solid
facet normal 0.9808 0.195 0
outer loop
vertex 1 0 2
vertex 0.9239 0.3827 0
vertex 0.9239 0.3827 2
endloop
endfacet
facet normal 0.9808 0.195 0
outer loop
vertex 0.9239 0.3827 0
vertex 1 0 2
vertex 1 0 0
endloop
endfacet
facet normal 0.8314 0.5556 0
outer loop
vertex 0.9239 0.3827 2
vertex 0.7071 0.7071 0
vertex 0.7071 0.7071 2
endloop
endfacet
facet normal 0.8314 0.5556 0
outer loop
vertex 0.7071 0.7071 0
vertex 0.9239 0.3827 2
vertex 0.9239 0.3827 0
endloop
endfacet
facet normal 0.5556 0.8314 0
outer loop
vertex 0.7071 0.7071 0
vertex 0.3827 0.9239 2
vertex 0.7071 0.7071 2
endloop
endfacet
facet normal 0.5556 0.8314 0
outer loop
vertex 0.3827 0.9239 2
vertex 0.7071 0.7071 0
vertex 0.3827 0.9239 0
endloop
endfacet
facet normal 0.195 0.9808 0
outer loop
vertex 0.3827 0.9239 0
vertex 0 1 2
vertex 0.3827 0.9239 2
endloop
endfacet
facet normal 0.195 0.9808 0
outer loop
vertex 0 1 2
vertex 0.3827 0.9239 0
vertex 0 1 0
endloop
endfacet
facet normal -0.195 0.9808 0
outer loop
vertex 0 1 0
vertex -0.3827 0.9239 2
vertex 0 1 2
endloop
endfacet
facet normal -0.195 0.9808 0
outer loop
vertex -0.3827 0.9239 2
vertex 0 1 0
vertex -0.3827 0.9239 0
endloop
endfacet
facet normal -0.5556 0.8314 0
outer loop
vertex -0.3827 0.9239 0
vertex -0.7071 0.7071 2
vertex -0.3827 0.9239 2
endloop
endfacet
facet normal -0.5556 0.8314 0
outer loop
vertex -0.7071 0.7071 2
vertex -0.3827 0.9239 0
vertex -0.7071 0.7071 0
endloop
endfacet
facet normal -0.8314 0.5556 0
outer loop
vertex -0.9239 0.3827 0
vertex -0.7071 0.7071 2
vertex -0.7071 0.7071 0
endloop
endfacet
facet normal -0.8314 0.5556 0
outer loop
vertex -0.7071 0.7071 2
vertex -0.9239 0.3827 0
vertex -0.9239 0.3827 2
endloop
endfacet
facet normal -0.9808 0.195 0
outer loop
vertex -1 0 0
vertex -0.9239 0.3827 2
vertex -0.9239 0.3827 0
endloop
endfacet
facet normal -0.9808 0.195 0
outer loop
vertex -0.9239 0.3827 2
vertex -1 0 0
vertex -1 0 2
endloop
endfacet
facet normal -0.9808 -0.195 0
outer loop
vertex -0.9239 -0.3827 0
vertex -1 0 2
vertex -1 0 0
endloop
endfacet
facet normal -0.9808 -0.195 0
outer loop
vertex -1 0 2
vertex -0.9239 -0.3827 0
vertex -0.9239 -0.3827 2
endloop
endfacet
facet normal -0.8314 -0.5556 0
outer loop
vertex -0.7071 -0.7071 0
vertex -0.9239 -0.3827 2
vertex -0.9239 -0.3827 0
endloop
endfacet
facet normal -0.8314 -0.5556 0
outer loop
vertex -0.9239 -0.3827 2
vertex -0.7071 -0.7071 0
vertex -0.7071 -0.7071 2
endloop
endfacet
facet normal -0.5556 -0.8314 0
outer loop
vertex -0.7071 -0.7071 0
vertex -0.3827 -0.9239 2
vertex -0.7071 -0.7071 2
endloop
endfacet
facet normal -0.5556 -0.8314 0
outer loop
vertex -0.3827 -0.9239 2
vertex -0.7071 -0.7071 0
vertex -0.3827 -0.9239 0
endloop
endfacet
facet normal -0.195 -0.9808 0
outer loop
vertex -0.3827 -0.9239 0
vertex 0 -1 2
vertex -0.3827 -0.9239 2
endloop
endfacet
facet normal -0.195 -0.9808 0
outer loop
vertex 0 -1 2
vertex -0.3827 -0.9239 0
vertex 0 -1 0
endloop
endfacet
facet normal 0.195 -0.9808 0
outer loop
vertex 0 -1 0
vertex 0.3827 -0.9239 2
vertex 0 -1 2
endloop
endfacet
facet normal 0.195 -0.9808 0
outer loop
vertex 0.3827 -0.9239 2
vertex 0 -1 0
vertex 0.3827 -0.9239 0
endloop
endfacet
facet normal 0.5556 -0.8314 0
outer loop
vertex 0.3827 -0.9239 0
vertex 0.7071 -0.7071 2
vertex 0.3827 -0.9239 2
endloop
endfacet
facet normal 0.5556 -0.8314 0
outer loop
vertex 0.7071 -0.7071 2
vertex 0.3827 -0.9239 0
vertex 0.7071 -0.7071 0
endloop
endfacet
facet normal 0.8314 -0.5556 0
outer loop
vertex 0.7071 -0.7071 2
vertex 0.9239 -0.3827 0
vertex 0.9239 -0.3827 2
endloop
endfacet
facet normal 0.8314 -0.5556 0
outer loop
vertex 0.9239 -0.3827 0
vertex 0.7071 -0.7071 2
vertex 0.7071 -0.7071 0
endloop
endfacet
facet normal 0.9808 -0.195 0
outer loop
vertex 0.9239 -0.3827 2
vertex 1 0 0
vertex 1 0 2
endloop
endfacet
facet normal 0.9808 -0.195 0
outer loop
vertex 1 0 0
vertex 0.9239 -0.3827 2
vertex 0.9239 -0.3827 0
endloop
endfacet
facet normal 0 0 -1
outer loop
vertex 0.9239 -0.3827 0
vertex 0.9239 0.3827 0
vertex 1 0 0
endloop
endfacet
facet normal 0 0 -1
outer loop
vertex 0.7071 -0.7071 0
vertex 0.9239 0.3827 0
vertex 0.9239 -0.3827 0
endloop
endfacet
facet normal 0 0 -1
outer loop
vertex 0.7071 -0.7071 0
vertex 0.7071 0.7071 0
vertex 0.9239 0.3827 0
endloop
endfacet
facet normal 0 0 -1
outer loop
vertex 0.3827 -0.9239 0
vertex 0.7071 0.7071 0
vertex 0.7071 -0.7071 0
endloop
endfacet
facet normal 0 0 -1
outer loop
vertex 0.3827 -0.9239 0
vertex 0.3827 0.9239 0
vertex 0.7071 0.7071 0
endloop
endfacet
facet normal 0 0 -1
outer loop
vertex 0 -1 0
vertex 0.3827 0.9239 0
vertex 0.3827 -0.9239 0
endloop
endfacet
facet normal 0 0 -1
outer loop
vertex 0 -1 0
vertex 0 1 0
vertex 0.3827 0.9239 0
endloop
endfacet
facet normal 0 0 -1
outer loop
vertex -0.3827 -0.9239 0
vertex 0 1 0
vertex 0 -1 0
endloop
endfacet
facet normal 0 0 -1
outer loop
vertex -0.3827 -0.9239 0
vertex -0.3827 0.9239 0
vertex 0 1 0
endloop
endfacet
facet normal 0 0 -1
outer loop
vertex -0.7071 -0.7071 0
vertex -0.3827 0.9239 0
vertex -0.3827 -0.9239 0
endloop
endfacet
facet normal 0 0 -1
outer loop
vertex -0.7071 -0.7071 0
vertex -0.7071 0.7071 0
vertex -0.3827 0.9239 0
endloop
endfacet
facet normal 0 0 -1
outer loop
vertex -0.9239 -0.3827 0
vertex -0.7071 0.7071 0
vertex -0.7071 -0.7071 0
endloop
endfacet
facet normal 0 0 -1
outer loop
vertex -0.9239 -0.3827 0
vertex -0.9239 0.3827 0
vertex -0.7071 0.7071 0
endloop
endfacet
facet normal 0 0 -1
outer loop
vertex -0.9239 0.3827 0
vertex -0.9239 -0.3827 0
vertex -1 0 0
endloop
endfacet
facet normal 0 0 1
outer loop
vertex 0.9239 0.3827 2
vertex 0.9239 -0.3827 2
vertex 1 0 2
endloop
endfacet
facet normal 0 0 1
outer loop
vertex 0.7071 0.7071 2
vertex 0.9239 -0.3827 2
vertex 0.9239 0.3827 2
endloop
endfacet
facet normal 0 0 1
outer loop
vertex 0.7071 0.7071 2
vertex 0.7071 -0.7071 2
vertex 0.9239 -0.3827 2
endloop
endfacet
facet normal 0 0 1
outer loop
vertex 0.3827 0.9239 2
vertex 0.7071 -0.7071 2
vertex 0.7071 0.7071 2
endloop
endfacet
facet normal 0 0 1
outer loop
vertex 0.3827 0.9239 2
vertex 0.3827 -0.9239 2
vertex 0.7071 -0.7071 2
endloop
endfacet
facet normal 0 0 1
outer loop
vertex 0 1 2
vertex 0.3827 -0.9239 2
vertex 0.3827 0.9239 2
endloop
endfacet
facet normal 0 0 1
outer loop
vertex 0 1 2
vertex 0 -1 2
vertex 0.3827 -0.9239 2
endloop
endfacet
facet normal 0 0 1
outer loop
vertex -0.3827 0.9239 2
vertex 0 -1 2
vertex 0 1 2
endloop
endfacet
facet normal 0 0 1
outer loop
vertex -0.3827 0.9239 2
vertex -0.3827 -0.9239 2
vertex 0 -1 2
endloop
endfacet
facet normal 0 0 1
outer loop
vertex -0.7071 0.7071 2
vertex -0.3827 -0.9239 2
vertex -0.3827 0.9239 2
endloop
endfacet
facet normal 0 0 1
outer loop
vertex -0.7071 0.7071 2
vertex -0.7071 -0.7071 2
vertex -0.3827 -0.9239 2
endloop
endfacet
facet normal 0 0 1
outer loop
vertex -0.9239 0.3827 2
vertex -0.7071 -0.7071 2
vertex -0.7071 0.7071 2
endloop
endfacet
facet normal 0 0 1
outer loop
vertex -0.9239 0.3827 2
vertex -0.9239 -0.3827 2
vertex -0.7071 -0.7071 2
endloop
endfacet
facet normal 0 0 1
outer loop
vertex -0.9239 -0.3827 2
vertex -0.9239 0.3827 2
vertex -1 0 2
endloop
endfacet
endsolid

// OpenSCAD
//############################################################################## 
//                          Odometer Magnet Wheel
//############################################################################## 
// 
// Odometer for the toy car Tamiya TT-02. The odometer can be mounted at the
// differential output shaft.
//
// This part is the magnet that triggers the hall sensor. A number of magnets
// are mounted in the magnet wheel. 

// Interface values
function Magnet_d() = 2;
function Magnet_w() = 2; 

module Magnet() {
    $fa = 4;
    $fs = 0.4;

    cylinder(d=Magnet_d(), h=Magnet_w());
}

Magnet();
